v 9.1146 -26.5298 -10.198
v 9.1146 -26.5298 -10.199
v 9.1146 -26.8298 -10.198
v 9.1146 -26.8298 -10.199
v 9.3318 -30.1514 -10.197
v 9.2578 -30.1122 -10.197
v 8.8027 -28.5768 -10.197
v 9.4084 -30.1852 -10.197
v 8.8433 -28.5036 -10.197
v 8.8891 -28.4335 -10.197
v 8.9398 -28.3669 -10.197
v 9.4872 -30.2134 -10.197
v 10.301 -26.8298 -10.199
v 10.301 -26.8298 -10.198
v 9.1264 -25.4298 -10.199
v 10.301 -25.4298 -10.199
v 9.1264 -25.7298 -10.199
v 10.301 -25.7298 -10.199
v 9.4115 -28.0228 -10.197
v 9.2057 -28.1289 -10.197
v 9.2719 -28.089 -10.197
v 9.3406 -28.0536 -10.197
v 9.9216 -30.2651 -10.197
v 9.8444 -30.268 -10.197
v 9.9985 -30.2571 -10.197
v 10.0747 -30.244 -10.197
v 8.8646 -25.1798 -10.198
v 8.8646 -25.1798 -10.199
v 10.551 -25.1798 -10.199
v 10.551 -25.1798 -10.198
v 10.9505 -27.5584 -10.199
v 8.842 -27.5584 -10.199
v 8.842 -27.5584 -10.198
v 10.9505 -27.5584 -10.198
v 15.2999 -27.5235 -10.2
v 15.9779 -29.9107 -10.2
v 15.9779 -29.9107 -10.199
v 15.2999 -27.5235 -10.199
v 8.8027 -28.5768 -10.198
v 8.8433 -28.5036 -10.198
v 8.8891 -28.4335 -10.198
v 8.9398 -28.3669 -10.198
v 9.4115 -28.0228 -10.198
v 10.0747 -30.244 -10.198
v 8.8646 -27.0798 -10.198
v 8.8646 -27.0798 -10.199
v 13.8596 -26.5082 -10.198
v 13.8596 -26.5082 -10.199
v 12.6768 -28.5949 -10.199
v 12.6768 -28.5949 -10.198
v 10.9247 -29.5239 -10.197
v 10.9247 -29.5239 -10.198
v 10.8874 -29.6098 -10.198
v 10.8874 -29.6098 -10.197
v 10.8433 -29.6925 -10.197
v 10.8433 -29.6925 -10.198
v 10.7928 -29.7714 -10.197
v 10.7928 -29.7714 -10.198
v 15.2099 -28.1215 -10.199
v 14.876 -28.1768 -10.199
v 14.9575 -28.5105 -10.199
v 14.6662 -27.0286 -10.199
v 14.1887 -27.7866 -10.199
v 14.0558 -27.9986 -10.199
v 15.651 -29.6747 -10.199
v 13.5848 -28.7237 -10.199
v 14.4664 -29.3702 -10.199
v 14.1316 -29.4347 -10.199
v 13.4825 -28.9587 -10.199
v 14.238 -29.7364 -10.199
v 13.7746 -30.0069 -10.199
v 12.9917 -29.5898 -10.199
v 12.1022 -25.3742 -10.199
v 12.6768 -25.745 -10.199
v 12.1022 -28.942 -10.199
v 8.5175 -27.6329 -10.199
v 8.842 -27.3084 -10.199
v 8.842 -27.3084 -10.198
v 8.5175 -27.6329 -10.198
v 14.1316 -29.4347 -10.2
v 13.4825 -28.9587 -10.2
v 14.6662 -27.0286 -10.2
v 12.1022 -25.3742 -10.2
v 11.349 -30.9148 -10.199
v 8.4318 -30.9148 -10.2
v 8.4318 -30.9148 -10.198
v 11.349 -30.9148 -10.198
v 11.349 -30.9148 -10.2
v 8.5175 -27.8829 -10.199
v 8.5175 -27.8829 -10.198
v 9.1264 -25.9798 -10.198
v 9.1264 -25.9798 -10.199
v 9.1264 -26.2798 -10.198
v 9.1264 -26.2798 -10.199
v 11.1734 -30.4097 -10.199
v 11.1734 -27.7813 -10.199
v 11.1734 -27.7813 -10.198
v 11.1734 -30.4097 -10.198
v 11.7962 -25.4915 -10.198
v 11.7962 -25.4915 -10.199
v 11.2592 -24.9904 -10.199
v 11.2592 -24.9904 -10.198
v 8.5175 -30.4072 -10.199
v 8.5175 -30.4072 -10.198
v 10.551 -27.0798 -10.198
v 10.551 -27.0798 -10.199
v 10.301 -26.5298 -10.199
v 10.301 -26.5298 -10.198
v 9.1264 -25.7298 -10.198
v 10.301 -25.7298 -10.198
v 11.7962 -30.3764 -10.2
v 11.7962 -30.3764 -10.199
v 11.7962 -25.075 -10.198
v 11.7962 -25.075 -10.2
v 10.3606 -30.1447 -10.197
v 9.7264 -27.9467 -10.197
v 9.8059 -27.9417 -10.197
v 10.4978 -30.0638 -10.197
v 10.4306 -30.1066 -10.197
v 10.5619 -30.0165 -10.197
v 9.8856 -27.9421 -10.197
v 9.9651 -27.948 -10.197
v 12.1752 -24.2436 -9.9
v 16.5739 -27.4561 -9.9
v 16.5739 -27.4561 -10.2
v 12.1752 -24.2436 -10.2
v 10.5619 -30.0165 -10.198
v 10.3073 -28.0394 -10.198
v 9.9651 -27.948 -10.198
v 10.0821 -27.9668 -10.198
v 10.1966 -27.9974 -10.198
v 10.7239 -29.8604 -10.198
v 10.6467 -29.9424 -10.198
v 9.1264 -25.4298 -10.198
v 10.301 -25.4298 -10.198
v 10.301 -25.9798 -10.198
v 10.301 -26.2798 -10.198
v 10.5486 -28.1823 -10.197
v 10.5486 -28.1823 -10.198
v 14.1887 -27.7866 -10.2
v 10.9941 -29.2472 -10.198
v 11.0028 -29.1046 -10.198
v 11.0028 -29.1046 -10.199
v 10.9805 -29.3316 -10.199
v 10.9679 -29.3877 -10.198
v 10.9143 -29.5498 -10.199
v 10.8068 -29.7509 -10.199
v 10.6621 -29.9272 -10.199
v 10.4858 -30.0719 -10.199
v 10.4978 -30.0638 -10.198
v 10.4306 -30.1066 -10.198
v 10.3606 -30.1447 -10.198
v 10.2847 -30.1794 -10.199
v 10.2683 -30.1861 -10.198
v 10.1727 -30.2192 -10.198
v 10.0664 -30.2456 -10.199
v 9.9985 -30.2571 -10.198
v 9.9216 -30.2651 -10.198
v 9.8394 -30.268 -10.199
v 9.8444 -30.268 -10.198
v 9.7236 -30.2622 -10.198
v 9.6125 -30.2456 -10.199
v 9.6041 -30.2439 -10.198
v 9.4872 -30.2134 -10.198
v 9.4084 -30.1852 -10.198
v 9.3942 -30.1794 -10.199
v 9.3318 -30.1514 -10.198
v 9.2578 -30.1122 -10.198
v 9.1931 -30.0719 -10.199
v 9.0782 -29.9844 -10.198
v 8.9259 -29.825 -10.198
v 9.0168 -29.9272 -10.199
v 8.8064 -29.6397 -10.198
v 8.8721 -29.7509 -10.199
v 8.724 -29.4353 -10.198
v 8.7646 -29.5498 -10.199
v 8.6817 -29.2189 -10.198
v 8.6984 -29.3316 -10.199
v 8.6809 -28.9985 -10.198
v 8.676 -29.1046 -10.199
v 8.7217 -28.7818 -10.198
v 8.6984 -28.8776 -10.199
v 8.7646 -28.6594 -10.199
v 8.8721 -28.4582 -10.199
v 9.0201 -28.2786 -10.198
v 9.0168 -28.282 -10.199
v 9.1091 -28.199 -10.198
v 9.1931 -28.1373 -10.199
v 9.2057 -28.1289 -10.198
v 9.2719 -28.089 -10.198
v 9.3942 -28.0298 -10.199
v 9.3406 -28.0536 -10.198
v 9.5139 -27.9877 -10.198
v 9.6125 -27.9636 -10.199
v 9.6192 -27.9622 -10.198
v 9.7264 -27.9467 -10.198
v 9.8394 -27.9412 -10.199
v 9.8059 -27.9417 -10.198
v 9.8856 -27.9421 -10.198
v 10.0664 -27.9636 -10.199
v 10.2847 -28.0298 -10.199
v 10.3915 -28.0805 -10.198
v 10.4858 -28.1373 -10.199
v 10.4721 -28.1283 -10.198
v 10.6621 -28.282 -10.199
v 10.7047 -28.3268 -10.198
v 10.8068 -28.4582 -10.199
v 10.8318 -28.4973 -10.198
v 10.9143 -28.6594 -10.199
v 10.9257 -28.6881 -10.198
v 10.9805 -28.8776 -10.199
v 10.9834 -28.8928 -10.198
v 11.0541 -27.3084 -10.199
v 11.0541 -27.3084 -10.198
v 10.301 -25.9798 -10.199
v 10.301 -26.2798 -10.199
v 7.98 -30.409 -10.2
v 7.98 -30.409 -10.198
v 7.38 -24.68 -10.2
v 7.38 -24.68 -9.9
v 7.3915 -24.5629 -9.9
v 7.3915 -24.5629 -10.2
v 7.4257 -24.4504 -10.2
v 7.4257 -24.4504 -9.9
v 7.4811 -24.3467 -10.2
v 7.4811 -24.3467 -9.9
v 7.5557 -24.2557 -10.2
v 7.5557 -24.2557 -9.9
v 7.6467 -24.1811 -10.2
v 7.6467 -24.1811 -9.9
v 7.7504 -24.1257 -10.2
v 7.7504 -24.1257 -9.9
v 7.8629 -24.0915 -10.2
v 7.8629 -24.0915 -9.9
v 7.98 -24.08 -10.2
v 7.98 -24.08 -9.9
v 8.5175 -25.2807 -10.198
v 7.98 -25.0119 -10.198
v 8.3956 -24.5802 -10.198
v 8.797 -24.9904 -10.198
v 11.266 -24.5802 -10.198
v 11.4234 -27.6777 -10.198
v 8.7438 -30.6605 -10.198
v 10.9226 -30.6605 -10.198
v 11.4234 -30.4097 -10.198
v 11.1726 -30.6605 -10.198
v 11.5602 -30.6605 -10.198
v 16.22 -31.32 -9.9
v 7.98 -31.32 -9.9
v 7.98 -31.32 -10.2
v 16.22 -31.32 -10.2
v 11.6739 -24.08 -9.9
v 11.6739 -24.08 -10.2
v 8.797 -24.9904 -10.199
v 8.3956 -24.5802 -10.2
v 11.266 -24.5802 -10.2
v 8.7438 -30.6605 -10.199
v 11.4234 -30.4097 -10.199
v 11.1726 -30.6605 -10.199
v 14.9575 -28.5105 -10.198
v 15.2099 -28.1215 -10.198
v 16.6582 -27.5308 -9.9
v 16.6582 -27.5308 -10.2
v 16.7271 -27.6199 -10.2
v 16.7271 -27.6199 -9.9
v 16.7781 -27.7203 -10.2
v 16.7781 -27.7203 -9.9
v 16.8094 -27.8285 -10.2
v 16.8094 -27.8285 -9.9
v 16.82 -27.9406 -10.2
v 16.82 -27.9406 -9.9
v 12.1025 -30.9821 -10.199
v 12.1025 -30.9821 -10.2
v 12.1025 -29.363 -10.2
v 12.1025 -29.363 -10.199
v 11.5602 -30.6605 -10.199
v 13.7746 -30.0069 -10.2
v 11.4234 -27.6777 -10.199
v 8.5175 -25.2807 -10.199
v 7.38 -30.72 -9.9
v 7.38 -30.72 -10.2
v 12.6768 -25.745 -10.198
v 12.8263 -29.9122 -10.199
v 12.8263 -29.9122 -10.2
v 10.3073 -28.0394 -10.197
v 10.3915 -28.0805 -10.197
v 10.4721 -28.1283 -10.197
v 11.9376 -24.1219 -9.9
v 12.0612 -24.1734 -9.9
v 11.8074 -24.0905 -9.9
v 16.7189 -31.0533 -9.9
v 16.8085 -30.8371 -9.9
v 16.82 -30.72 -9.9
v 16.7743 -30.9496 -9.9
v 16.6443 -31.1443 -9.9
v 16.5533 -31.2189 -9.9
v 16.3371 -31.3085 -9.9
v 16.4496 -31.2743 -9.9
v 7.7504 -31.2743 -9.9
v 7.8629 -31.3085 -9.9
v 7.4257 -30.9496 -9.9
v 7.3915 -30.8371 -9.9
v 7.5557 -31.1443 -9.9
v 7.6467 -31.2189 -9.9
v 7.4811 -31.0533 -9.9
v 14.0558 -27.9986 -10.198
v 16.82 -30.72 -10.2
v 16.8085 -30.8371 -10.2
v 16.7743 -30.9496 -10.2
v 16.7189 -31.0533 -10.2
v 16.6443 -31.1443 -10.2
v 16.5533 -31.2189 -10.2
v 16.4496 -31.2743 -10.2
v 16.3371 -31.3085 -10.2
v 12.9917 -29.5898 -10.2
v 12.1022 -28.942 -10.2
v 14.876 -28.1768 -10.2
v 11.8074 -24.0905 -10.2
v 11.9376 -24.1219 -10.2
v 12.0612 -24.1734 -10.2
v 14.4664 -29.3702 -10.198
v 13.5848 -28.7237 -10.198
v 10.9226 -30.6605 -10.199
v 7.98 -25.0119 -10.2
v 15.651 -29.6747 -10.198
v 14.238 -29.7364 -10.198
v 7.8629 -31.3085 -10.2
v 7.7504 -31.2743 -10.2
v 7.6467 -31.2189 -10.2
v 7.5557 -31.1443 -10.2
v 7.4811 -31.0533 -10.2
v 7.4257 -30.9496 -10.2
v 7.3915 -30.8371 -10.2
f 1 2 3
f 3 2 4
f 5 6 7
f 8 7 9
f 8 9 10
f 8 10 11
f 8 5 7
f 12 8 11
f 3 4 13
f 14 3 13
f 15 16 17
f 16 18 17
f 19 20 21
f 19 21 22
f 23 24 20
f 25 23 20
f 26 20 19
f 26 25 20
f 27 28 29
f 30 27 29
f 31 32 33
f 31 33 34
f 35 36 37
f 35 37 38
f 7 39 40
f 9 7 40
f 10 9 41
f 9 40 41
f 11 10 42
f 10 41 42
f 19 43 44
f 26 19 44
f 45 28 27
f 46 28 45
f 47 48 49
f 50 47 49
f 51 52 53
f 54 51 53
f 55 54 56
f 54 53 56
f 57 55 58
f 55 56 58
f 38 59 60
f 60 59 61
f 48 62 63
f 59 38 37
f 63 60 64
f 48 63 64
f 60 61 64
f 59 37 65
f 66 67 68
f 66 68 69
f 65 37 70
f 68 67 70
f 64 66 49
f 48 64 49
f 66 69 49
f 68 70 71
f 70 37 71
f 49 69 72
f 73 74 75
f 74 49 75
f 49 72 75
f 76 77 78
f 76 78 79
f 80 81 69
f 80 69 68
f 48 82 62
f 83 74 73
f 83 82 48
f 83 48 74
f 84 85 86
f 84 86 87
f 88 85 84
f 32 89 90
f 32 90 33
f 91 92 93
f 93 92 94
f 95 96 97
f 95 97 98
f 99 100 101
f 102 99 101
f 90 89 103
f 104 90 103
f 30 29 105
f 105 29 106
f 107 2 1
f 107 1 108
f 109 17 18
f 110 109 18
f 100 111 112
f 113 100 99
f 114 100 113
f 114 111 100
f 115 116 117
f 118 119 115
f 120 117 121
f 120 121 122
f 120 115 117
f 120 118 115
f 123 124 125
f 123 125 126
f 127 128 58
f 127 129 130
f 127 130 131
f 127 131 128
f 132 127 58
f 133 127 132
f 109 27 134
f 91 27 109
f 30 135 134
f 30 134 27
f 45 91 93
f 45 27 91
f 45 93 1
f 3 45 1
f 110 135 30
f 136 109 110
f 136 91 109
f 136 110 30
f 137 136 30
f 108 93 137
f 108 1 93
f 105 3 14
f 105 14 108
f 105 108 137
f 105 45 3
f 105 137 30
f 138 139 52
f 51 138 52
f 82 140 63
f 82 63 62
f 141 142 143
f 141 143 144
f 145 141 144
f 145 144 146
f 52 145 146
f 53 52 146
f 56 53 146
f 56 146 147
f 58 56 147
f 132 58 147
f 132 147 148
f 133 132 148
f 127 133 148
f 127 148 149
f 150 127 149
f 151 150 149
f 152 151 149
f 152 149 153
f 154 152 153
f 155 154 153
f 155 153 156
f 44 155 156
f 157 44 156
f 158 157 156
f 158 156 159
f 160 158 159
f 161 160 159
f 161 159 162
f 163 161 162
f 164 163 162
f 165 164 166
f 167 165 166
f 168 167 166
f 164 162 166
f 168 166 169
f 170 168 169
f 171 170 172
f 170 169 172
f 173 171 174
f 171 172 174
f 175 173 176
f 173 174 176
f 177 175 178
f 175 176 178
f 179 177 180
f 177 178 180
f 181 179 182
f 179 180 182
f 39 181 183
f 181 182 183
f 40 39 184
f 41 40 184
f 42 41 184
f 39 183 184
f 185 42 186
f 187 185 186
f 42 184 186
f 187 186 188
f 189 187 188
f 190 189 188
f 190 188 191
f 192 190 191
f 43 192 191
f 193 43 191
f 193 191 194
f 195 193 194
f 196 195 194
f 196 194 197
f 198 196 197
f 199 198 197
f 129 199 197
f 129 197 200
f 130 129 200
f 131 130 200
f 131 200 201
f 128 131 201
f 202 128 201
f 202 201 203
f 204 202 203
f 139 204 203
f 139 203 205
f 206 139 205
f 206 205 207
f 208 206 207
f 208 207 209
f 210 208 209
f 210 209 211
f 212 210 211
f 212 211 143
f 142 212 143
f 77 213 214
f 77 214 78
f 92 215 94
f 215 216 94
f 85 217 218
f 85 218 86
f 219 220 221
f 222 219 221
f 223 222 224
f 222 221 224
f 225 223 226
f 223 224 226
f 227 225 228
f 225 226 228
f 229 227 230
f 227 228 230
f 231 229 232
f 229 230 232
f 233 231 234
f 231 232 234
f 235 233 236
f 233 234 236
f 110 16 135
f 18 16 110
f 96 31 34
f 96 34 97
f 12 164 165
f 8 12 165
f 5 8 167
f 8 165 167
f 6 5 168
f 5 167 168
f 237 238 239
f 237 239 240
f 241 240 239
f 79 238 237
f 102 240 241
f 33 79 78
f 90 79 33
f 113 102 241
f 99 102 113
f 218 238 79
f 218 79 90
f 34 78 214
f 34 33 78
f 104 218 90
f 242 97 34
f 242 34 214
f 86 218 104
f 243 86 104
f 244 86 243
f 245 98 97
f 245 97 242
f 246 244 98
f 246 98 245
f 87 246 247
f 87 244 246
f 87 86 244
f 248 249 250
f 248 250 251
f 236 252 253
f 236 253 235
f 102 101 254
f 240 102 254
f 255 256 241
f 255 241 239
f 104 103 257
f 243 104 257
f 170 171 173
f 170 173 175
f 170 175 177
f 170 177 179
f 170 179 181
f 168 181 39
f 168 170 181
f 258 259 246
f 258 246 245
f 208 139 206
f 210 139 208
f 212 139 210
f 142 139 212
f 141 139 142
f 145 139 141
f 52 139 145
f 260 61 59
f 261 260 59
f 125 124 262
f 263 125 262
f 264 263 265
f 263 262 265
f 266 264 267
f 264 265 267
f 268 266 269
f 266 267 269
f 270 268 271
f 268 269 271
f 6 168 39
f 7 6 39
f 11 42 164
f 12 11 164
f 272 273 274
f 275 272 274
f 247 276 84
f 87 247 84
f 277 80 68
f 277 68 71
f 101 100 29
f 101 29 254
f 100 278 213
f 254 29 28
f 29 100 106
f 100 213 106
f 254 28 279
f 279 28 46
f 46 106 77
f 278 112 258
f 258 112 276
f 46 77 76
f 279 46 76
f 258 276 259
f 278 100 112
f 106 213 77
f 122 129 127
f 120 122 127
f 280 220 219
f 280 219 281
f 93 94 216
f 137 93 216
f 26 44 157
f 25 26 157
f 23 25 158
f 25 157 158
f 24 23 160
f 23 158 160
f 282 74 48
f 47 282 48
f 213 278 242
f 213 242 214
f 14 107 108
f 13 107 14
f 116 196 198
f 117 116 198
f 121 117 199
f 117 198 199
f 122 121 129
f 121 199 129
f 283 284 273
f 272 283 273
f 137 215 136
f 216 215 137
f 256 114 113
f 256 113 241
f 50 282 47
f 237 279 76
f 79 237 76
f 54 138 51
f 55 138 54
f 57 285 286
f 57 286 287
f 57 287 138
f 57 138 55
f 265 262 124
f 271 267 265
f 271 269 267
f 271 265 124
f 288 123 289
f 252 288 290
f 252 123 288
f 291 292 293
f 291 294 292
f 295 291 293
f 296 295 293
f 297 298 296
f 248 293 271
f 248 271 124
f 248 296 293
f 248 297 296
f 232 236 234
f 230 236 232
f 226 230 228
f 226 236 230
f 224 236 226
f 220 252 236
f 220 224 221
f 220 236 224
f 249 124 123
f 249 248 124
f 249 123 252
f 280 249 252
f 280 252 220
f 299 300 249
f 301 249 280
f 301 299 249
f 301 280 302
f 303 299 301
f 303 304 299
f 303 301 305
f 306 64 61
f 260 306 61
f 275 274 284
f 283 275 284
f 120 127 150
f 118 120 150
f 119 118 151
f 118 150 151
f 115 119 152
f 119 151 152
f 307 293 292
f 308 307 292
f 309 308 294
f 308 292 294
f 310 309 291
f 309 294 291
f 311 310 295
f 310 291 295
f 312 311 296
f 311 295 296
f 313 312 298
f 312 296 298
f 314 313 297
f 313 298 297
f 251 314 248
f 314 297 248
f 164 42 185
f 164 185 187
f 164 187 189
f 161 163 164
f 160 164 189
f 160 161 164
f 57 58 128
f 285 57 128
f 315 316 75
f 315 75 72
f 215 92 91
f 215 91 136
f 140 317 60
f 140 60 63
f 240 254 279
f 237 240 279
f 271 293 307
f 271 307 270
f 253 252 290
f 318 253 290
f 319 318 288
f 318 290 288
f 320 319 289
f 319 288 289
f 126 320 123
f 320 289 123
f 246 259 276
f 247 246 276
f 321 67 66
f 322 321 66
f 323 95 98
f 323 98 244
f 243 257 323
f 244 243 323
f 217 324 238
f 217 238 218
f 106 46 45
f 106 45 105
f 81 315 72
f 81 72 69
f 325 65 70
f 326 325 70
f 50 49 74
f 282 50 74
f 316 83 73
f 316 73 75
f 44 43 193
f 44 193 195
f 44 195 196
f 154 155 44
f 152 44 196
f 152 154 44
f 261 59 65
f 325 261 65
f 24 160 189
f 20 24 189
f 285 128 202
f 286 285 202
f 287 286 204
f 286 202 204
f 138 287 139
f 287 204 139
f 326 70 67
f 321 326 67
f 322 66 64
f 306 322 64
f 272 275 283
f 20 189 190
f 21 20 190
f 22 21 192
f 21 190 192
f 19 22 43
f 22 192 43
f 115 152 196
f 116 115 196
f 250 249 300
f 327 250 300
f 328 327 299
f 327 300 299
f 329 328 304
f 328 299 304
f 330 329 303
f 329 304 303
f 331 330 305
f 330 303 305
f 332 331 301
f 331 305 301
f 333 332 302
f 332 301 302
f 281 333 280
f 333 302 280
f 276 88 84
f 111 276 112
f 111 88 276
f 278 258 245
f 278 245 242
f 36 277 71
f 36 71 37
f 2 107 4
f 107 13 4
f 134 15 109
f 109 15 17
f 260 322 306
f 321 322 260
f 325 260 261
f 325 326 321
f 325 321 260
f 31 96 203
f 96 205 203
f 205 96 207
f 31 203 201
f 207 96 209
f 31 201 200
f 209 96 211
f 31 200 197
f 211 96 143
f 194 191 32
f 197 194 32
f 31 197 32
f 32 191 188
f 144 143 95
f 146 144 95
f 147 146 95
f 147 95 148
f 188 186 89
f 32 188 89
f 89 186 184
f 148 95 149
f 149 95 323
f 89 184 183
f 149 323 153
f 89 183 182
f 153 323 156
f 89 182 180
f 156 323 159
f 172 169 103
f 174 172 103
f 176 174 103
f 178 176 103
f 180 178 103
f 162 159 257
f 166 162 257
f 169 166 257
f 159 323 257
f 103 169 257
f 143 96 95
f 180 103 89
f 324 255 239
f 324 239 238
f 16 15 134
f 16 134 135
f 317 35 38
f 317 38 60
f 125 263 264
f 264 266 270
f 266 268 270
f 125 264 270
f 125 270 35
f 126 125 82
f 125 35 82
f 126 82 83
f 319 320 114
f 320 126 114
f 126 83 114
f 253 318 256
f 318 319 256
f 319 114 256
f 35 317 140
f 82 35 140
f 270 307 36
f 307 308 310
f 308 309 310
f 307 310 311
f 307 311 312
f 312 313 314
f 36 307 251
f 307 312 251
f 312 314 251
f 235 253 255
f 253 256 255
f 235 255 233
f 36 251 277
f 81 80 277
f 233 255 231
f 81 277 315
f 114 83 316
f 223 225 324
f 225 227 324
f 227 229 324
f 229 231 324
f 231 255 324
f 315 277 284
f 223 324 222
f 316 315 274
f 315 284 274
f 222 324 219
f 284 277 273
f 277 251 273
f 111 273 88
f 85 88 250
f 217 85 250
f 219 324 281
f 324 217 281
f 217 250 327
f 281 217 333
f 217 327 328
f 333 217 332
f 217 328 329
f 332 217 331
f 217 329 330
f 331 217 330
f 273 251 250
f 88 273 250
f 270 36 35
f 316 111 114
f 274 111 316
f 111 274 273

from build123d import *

# Parameters (mm, degrees)
PAD007_DEPTH    = 0.3
POCKET017_DEPTH = 0.001
SKETCH026_R     = 1.163393
SKETCH026_W     = 1.686406
SKETCH026_H     = 1.9
SKETCH026_W_2   = 1.186406
SKETCH026_H_2   = 0.3
SKETCH026_W_3   = 1.174595
POCKET018_DEPTH = 0.001
POCKET019_DEPTH = 0.001
POCKET020_DEPTH = 0.001


with BuildPart() as part:
    # Sketch024 (on Face1 of Binder007) → Pad007 (new body)
    with BuildSketch(Plane(origin=(0, 0, -9.9), x_dir=(1, 0, 0), z_dir=(0, 0, -1))):
        with BuildLine():
            Line((7.98, 31.32), (16.22, 31.32))
            ThreePointArc((16.82, 30.72), (16.6442640687, 31.1442640687), (16.22, 31.32))
            Line((16.82, 30.72), (16.82, 27.9406370227))
            ThreePointArc((16.5738752133, 27.456103914), (16.7549416454, 27.6689065754), (16.82, 27.9406370227))
            Line((16.5738752133, 27.456103914), (12.1752198046, 24.2435780961))
            ThreePointArc((11.6738965857, 24.08), (11.9375643517, 24.1219286485), (12.1752198046, 24.2435780961))
            Line((11.6738965857, 24.08), (7.98, 24.08))
            ThreePointArc((7.38, 24.68), (7.5557359313, 24.2557359313), (7.98, 24.08))
            Line((7.38, 24.68), (7.38, 30.72))
            ThreePointArc((7.98, 31.32), (7.5557359313, 31.1442640687), (7.38, 30.72))
        make_face()
    extrude(amount=PAD007_DEPTH)

    # Sketch025 (on Face12 of Pad007) → Pocket017 (cut)
    with BuildSketch(Plane(origin=(0, 0, -10.2), x_dir=(1, 0, 0), z_dir=(0, 0, -1))):
        Polygon((12.102176, 25.374237), (12.102176, 28.942009), (12.991714, 29.589825), (13.482487, 28.95867), (14.131579, 29.434669), (13.774637, 30.006891), (15.977887, 29.910671), (15.299946, 27.523453), (14.87602, 28.17679), (14.188738, 27.786554), (14.666163, 27.028563), align=None)
        Polygon((12.102467, 30.982145), (12.102467, 29.362982), (12.826257, 29.912151), align=None)
        Polygon((8.431841, 30.914753), (11.34897, 30.914753), (11.796237, 30.37645), (11.796237, 25.074999), (11.265965, 24.580235), (8.395573, 24.580235), (7.97997, 25.011898), (7.97997, 30.409004), align=None)
    extrude(amount=-POCKET017_DEPTH, mode=Mode.SUBTRACT)

    # Sketch026 (on Face37 of Pocket017) → Pocket018 (cut)
    with BuildSketch(Plane(origin=(0, 0, -10.199), x_dir=(1, 0, 0), z_dir=(0, 0, -1))):
        with Locations((9.839442, 29.104595)):
            Circle(SKETCH026_R)
        Polygon((12.6767981502, 25.7449925316), (13.8596307851, 26.5081753331), (12.6767981502, 28.59486), align=None)
        Polygon((13.5847758274, 28.7236640124), (14.0558425062, 27.9985847628), (14.9574833561, 28.5105328695), (15.2099026348, 28.1215148469), (15.6509909251, 29.6747088656), (14.2380048667, 29.7364165785), (14.4664364148, 29.370212665), align=None)
        Polygon((11.796237, 25.4914768154), (11.259242, 24.99044), (8.7969567798, 24.99044), (8.517493, 25.280703), (8.517493, 30.407208), (8.7438247535, 30.660526), (11.5602029814, 30.660526), (11.34897, 30.914753), (8.431841, 30.914753), (7.97997, 30.409004), (7.97997, 25.011898), (8.395573, 24.580235), (11.265965, 24.580235), (11.796237, 25.074999), align=None)
        with Locations((9.707757, 26.129756)):
            Rectangle(SKETCH026_W, SKETCH026_H)
        with Locations((9.707757, 26.679756)):
            Rectangle(SKETCH026_W_2, SKETCH026_H_2, mode=Mode.SUBTRACT)
        with Locations((9.7136625, 26.129756)):
            Rectangle(SKETCH026_W_3, SKETCH026_H_2, mode=Mode.SUBTRACT)
        with Locations((9.7136625, 25.579756)):
            Rectangle(SKETCH026_W_3, SKETCH026_H_2, mode=Mode.SUBTRACT)
    extrude(amount=-POCKET018_DEPTH, mode=Mode.SUBTRACT)

    # Sketch027 (on Face1 of Pocket018) → Pocket019 (cut)
    with BuildSketch(Plane(origin=(0, 0, -10.199), x_dir=(1, 0, 0), z_dir=(0, 0, -1))):
        Polygon((8.517493, 27.6328851722), (8.517493, 27.8828851722), (8.841954765, 27.5584234072), (10.9505429311, 27.5584234072), (11.1733869231, 27.7812673992), (11.1733869231, 30.4097335481), (10.9225944712, 30.660526), (11.1725944712, 30.660526), (11.4233869231, 30.4097335481), (11.4233869231, 27.6777140086), (11.0540963217, 27.3084234072), (8.841954765, 27.3084234072), align=None)
    extrude(amount=-POCKET019_DEPTH, mode=Mode.SUBTRACT)

    # Sketch028 (on Face90 of Pocket019) → Pocket020 (cut)
    with BuildSketch(Plane(origin=(0, 0, -10.198), x_dir=(1, 0, 0), z_dir=(0, 0, -1))):
        with BuildLine():
            Line((9.257822177, 30.1121671582), (8.8026697446, 28.576782))
            ThreePointArc((8.8026697446, 28.576782), (8.8655769652, 28.4681437713), (8.9398235996, 28.3669162039))
            Line((8.9398235996, 28.3669162039), (9.4871926987, 30.2133797862))
            ThreePointArc((9.4871926987, 30.2133797862), (9.3697730907, 30.1689701162), (9.257822177, 30.1121671582))
        make_face()
        with BuildLine():
            Line((9.844371, 30.2679775585), (9.2057279774, 28.1289465951))
            ThreePointArc((9.2057279774, 28.1289465951), (9.3059562649, 28.0707302879), (9.41148, 28.0227762541))
            Line((9.41148, 28.0227762541), (10.074652, 30.243963039))
            ThreePointArc((10.074652, 30.243963039), (9.9601103849, 30.2617131501), (9.844371, 30.2679775585))
        make_face()
        with BuildLine():
            Line((10.3605789255, 30.1447390176), (9.72639, 27.946707908))
            ThreePointArc((9.72639, 27.946707908), (9.8457884939, 27.9412193107), (9.96512, 27.9480102375))
            Line((9.96512, 27.9480102375), (10.5619225192, 30.0164640541))
            ThreePointArc((10.5619225192, 30.0164640541), (10.4645497537, 30.0857797781), (10.3605789255, 30.1447390176))
        make_face()
        with BuildLine():
            Line((10.7927776556, 29.7714041182), (10.3073094918, 28.0394268055))
            ThreePointArc((10.3073094918, 28.0394268055), (10.4322899025, 28.1035881884), (10.5486252769, 28.1823464694))
            Line((10.5486252769, 28.1823464694), (10.9246531985, 29.5238800191))
            ThreePointArc((10.9246531985, 29.5238800191), (10.8662016428, 29.6516305641), (10.7927776556, 29.7714041182))
        make_face()
    extrude(amount=-POCKET020_DEPTH, mode=Mode.SUBTRACT)


solid = part.part
